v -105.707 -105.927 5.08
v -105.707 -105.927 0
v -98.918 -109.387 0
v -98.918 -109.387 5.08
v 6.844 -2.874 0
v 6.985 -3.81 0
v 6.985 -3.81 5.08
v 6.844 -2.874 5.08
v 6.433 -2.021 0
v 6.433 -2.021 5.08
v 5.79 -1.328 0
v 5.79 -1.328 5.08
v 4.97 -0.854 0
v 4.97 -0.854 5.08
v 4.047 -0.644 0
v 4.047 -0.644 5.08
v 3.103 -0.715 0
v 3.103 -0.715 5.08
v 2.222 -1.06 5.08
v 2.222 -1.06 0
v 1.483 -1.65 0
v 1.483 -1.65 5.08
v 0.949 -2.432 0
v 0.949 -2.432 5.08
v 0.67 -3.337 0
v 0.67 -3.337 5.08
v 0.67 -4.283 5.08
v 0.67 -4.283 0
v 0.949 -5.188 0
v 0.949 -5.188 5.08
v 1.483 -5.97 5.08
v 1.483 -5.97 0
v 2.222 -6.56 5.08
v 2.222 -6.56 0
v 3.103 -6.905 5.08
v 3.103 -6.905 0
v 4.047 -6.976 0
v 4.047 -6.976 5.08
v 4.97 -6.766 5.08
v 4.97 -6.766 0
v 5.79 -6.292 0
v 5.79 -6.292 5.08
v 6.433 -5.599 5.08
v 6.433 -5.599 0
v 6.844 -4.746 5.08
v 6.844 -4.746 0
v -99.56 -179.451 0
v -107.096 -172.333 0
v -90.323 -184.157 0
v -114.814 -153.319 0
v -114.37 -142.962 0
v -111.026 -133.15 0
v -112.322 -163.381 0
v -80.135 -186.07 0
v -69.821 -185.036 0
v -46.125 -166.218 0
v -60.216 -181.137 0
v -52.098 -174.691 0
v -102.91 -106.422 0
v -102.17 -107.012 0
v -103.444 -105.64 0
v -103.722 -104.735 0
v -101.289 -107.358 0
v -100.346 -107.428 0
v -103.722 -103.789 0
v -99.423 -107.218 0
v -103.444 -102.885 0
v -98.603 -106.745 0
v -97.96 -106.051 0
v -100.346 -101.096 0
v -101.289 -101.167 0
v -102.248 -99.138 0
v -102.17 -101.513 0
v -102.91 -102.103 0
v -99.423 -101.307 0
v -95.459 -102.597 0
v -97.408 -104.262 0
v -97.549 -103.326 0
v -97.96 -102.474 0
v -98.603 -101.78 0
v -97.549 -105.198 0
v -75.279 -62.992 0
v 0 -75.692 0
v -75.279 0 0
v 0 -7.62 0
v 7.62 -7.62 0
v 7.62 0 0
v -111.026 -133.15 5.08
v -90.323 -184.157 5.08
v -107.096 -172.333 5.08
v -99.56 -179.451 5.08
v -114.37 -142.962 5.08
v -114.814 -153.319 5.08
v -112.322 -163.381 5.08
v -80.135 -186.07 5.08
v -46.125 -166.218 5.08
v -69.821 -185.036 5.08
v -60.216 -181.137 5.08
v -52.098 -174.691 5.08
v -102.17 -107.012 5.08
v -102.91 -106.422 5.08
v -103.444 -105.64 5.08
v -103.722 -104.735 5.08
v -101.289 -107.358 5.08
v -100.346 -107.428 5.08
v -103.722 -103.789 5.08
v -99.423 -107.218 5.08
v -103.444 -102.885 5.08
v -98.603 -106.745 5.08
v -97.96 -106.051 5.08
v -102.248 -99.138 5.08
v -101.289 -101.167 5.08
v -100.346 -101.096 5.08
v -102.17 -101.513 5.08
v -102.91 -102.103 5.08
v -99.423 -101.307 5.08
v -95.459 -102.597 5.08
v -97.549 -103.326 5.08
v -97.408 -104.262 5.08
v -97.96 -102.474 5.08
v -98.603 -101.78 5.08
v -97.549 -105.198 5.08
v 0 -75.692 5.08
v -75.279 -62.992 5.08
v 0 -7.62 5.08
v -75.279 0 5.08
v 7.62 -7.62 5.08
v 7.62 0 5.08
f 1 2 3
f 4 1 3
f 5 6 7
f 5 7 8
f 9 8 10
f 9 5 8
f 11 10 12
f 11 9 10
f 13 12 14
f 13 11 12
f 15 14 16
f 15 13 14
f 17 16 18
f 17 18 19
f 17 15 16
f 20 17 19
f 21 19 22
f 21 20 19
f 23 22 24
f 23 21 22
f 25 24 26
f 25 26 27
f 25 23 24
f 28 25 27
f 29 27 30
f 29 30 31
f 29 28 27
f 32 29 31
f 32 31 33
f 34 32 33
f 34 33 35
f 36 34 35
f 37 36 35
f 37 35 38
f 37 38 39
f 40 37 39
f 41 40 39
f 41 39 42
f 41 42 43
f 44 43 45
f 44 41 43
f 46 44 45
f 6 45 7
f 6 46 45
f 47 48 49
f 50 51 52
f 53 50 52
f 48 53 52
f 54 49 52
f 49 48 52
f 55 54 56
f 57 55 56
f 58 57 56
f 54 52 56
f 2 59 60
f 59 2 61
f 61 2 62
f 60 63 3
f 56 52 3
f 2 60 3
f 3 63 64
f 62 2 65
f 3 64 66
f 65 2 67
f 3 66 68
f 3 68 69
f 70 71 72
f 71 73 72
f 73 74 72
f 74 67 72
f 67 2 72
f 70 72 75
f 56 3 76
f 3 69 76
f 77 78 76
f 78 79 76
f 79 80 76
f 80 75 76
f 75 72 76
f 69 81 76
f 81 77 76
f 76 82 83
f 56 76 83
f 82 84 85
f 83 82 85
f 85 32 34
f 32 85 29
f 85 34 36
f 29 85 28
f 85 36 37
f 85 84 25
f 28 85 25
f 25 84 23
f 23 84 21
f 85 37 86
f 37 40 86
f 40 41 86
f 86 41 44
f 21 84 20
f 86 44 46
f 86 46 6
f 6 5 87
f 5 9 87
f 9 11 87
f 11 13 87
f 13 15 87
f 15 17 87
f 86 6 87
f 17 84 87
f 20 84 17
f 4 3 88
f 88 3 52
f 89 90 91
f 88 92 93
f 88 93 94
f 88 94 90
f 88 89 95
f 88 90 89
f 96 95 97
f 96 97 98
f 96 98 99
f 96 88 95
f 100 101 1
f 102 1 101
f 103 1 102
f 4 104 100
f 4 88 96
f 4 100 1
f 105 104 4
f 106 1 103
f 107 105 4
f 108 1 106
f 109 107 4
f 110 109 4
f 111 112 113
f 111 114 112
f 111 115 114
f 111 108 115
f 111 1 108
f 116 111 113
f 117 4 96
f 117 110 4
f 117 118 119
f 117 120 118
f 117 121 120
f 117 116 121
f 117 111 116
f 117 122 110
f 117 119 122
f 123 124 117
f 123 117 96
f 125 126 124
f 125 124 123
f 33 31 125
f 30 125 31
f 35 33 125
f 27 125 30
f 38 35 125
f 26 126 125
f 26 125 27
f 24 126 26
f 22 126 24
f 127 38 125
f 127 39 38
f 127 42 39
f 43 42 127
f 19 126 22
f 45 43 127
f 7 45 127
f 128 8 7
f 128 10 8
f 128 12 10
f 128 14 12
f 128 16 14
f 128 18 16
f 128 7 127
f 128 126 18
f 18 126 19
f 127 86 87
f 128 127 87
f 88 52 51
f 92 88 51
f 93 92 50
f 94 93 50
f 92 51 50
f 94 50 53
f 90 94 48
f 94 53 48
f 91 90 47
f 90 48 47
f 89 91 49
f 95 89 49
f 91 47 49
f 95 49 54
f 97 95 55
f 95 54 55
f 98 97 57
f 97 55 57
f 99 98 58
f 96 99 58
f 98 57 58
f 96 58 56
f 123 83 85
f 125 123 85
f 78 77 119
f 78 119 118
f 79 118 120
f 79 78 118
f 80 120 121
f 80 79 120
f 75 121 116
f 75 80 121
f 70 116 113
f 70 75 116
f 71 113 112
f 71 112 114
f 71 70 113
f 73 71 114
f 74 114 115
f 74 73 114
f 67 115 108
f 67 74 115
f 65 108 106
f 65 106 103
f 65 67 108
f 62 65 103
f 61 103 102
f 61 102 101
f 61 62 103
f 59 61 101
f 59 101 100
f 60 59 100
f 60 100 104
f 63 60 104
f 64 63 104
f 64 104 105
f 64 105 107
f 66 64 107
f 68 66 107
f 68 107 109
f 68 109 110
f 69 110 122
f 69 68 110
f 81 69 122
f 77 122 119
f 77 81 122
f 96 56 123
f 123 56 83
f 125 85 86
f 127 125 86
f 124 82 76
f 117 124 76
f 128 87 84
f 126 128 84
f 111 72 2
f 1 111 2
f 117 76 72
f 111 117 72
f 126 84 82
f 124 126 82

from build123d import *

# Parameters (mm, degrees)
SKETCH2_R           = 3.175
BOSS_EXTRUDE1_DEPTH = 5.08


with BuildPart() as part:
    # Sketch2 → Boss-Extrude1 (new body)
    with BuildSketch(Plane.XY):
        with BuildLine():
            Line((-95.458507722, -102.59724), (-102.247977436, -99.137832392))
            Line((-102.247977436, -99.137832392), (-105.707385044, -105.927302106))
            Line((-105.707385044, -105.927302106), (-98.91791533, -109.386709714))
            Line((-98.91791533, -109.386709714), (-111.025841958, -133.149853715))
            ThreePointArc((-111.025841958, -133.149853715), (-95.109842937, -182.134261878), (-46.125434774, -166.218262858))
            Line((-46.125434774, -166.218262858), (0, -75.692))
            Line((0, -75.692), (0, -7.62))
            Line((0, -7.62), (7.62, -7.62))
            Line((7.62, -7.62), (7.62, 0))
            Line((7.62, 0), (0, 0))
            Line((0, 0), (-75.278630008, 0))
            Line((-75.278630008, 0), (-75.278630008, -62.992))
            Line((-75.278630008, -62.992), (-95.458507722, -102.59724))
        make_face()
        with Locations((3.81, -3.81)):
            Circle(SKETCH2_R, mode=Mode.SUBTRACT)
        with Locations((-100.582946383, -104.262271053)):
            Circle(SKETCH2_R, mode=Mode.SUBTRACT)
    extrude(amount=BOSS_EXTRUDE1_DEPTH)


solid = part.part
